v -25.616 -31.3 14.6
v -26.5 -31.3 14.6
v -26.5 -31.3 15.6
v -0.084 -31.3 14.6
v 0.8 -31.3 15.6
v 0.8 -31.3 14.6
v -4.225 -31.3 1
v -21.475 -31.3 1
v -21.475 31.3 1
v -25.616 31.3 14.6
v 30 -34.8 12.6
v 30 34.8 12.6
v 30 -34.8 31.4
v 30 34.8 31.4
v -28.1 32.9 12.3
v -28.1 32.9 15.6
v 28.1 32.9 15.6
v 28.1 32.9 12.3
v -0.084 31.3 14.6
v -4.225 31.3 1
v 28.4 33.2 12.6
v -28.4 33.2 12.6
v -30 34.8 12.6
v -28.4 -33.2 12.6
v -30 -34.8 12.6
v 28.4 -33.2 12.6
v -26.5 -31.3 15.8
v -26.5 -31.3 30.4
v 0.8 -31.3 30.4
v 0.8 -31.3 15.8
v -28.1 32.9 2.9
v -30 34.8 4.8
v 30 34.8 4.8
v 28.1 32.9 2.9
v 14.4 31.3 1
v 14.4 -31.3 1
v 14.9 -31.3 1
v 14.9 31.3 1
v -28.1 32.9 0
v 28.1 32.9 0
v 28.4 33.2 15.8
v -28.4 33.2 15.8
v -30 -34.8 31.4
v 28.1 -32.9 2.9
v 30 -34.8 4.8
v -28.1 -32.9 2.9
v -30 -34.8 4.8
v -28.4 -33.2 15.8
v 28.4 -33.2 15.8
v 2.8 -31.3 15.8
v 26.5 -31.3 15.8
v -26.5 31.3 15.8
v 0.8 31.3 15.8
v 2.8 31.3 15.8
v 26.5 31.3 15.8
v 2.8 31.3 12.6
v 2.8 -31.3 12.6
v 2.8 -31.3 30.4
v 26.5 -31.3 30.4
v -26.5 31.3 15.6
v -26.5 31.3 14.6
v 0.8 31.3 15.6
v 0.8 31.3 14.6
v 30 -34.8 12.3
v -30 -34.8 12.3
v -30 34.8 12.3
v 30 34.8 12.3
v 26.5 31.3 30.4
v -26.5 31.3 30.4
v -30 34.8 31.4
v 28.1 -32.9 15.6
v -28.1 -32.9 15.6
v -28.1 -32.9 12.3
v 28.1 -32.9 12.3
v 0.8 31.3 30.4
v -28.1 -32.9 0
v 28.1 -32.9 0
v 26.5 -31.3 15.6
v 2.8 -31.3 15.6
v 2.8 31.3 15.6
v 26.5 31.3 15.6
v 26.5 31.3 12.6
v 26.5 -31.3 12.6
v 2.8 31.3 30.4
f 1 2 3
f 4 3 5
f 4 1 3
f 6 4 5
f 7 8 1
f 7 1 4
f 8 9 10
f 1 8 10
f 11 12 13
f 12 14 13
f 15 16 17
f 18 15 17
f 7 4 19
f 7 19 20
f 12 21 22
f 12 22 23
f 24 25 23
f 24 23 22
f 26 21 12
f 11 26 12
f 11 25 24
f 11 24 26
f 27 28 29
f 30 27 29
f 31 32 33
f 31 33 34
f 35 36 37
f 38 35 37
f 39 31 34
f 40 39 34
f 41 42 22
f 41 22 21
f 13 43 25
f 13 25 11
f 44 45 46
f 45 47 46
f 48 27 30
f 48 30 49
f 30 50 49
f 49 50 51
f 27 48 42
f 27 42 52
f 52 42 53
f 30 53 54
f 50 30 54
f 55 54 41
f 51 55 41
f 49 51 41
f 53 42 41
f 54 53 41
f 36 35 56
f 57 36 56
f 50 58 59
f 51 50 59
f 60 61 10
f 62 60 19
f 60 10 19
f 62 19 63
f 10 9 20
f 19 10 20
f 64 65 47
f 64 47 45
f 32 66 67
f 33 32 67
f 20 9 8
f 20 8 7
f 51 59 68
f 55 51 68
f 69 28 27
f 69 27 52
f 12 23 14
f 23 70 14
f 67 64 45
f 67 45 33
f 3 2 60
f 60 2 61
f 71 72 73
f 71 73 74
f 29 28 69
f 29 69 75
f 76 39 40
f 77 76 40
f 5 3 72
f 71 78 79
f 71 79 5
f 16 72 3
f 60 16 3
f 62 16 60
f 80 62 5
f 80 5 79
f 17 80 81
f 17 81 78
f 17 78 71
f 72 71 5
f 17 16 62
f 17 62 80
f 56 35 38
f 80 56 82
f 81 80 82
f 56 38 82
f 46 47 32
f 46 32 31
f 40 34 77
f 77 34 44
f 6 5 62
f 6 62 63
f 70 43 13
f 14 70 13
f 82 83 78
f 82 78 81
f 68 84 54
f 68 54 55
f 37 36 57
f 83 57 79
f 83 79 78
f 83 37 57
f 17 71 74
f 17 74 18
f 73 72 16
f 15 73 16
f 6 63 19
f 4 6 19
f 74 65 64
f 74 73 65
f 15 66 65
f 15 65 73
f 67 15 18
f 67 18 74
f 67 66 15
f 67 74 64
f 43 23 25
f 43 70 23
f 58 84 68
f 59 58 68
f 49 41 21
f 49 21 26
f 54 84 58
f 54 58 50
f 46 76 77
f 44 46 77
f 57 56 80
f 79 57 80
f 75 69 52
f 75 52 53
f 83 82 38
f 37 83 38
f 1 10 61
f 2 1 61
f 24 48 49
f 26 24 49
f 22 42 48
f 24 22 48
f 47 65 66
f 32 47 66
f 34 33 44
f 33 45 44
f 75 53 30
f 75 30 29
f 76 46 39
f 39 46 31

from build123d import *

# Parameters (mm, degrees)
F6_W          = 60
F6_H          = 69.6
F7_DEPTH      = 1
F8_W          = 60
F8_H          = 69.6
F8_W_2        = 53
F8_H_2        = 62.6
F9_DEPTH      = 14.6
F11_DEPTH     = 62.6
F14_W         = 60
F14_H         = 69.6
F14_W_2       = 56.2
F14_H_2       = 65.8
F15_DEPTH     = 3.3
F16_W         = 60
F16_H         = 69.6
F16_W_2       = 56.2
F16_H_2       = 65.8
F17_DEPTH     = 4.9
F18_T4_DEPTH  = 56.2
F18_T9_DEPTH  = 65.8
F18_T14_DEPTH = 56.2
F18_T19_DEPTH = 65.8
F18_T25_DEPTH = 61.3433659759
F18_T31_DEPTH = 70.9433659759
F18_T40_DEPTH = 61.3433659759
F18_T46_DEPTH = 70.9433659759
F18_T55_DEPTH = 61.3433659759
F18_T61_DEPTH = 70.9433659759
F18_T70_DEPTH = 70.9433659759
F18_T76_DEPTH = 61.3433659759
F19_W         = 60
F19_H         = 69.6
F19_W_2       = 56.8
F19_H_2       = 66.4
F20_DEPTH     = 3.2
F21_DEPTH     = 62.6


# Not quite as in the source:
# - a fillet or chamfer that OpenCascade refuses, or shapes differently, is made with other operations: its cross-section is extruded or revolved along the edge and cut away or added


with BuildPart() as f7:
    # F6 (on Top) → F7 (new body)
    with BuildSketch(Plane.XY):
        Rectangle(F6_W, F6_H)
    extrude(amount=F7_DEPTH)

    # F8 (on face) → F9 (join)
    with BuildSketch(Plane.XY.offset(1)):
        Rectangle(F8_W, F8_H)
        Rectangle(F8_W_2, F8_H_2, mode=Mode.SUBTRACT)
    extrude(amount=F9_DEPTH)

    # F10 (on face) → F11 (join, through all)
    with BuildSketch(Plane.XZ.offset(-31.3)):
        Polygon((2.8, 15.6), (0.8, 15.6), (0.8, 14.6), (0.8, 1), (2.8, 1), (2.8, 12.6), align=None)
    extrude(amount=F11_DEPTH)


with BuildPart() as f13_1:
    # F13: instance of F7
    add(f7.part.mirror(Plane(origin=(0.2291641245, 0, 15.7), x_dir=(1, 0, 0), z_dir=(0, 0, 1))))

    # F19 (on face) → F20 (join)
    with BuildSketch(Plane(origin=(0, 0, 15.8), x_dir=(1, 0, 0), z_dir=(0, 0, -1))):
        Rectangle(F19_W, F19_H)
        Rectangle(F19_W_2, F19_H_2, mode=Mode.SUBTRACT)
    extrude(amount=F20_DEPTH)


with BuildPart() as f7_1:
    add(f7.part)

    # F14 (on face) → F15 (cut)
    with BuildSketch(Plane.XY.offset(15.6)):
        Rectangle(F14_W, F14_H)
        Rectangle(F14_W_2, F14_H_2, mode=Mode.SUBTRACT)
    extrude(amount=-F15_DEPTH, mode=Mode.SUBTRACT)

    # F16 (on face) → F17 (cut)
    with BuildSketch(Plane(origin=(0, 0, 0), x_dir=(1, 0, 0), z_dir=(0, 0, -1))):
        Rectangle(F16_W, F16_H)
        Rectangle(F16_W_2, F16_H_2, mode=Mode.SUBTRACT)
    extrude(amount=-F17_DEPTH, mode=Mode.SUBTRACT)

    # F18: chamfer of 2 on 4 edges, made by hand


with BuildPart() as f18_tool2:
    # F18_s3 → F18_t4 (new body)
    with BuildSketch(Plane.YZ.offset(-28.1)):
        Polygon((-34.9, 4.9), (-32.9, 2.9), (-32.9, 4.9), align=None)
    extrude(amount=F18_T4_DEPTH)

    split(bisect_by=Plane.XZ.offset(34.8), keep=Keep.BOTTOM)


with BuildPart() as f7_2:
    add(f7_1.part)

    # F18_t1: union F18_tool2
    add(f18_tool2.part)


with BuildPart() as f18_tool7:
    # F18_s8 → F18_t9 (new body)
    with BuildSketch(Plane.XZ.offset(-32.9)):
        Polygon((-30.1, 4.9), (-28.1, 2.9), (-28.1, 4.9), align=None)
    extrude(amount=F18_T9_DEPTH)

    split(bisect_by=Plane.YZ.offset(-30), keep=Keep.TOP)


with BuildPart() as f7_3:
    add(f7_2.part)

    # F18_t6: union F18_tool7
    add(f18_tool7.part)


with BuildPart() as f18_tool12:
    # F18_s13 → F18_t14 (new body)
    with BuildSketch(Plane.YZ.offset(28.1)):
        Polygon((34.9, 4.9), (32.9, 2.9), (32.9, 4.9), align=None)
    extrude(amount=-F18_T14_DEPTH)

    split(bisect_by=Plane.XZ.offset(-34.8), keep=Keep.TOP)


with BuildPart() as f7_4:
    add(f7_3.part)

    # F18_t11: union F18_tool12
    add(f18_tool12.part)


with BuildPart() as f18_tool17:
    # F18_s18 → F18_t19 (new body)
    with BuildSketch(Plane.XZ.offset(32.9)):
        Polygon((30.1, 4.9), (28.1, 2.9), (28.1, 4.9), align=None)
    extrude(amount=-F18_T19_DEPTH)

    split(bisect_by=Plane.YZ.offset(30), keep=Keep.BOTTOM)


with BuildPart() as f7_5:
    add(f7_4.part)

    # F18_t16: union F18_tool17
    add(f18_tool17.part)


with BuildPart() as f18_tool23:
    # F18_s24 → F18_t25 (new body)
    with BuildSketch(Plane.YZ.offset(-33.2433659759)):
        Polygon((-34.9, 4.9), (-32.9, 2.9), (-32.9, 4.9), align=None)
    extrude(amount=F18_T25_DEPTH)

    split(bisect_by=Plane.XZ.offset(34.8), keep=Keep.BOTTOM)

    split(bisect_by=Plane.YZ.offset(-30), keep=Keep.TOP)

    split(bisect_by=Plane.YZ.offset(-28.1), keep=Keep.BOTTOM)


with BuildPart() as f18_tool29:
    # F18_s30 → F18_t31 (new body)
    with BuildSketch(Plane.XZ.offset(-32.9)):
        Polygon((-30.1, 4.9), (-28.1, 2.9), (-28.1, 4.9), align=None)
    extrude(amount=F18_T31_DEPTH)

    split(bisect_by=Plane.XZ.offset(34.8), keep=Keep.BOTTOM)

    split(bisect_by=Plane.YZ.offset(-30), keep=Keep.TOP)

    split(bisect_by=Plane.XZ.offset(32.9), keep=Keep.TOP)


with BuildPart() as f18_tool23_1:
    add(f18_tool23.part)

    # F18_t35: intersect F18_tool29
    add(f18_tool29.part, mode=Mode.INTERSECT)


with BuildPart() as f7_6:
    add(f7_5.part)

    # F18_t21: union F18_tool23
    add(f18_tool23_1.part)


with BuildPart() as f18_tool38:
    # F18_s39 → F18_t40 (new body)
    with BuildSketch(Plane.YZ.offset(-28.1)):
        Polygon((-34.9, 4.9), (-32.9, 2.9), (-32.9, 4.9), align=None)
    extrude(amount=F18_T40_DEPTH)

    split(bisect_by=Plane.XZ.offset(34.8), keep=Keep.BOTTOM)

    split(bisect_by=Plane.YZ.offset(30), keep=Keep.BOTTOM)

    split(bisect_by=Plane.YZ.offset(28.1), keep=Keep.TOP)


with BuildPart() as f18_tool44:
    # F18_s45 → F18_t46 (new body)
    with BuildSketch(Plane.XZ.offset(38.0433659759)):
        Polygon((30.1, 4.9), (28.1, 2.9), (28.1, 4.9), align=None)
    extrude(amount=-F18_T46_DEPTH)

    split(bisect_by=Plane.XZ.offset(34.8), keep=Keep.BOTTOM)

    split(bisect_by=Plane.YZ.offset(30), keep=Keep.BOTTOM)

    split(bisect_by=Plane.XZ.offset(32.9), keep=Keep.TOP)


with BuildPart() as f18_tool38_1:
    add(f18_tool38.part)

    # F18_t50: intersect F18_tool44
    add(f18_tool44.part, mode=Mode.INTERSECT)


with BuildPart() as f7_7:
    add(f7_6.part)

    # F18_t36: union F18_tool38
    add(f18_tool38_1.part)


with BuildPart() as f18_tool53:
    # F18_s54 → F18_t55 (new body)
    with BuildSketch(Plane.YZ.offset(28.1)):
        Polygon((34.9, 4.9), (32.9, 2.9), (32.9, 4.9), align=None)
    extrude(amount=-F18_T55_DEPTH)

    split(bisect_by=Plane.YZ.offset(-30), keep=Keep.TOP)

    split(bisect_by=Plane.XZ.offset(-34.8), keep=Keep.TOP)

    split(bisect_by=Plane.YZ.offset(-28.1), keep=Keep.BOTTOM)


with BuildPart() as f18_tool59:
    # F18_s60 → F18_t61 (new body)
    with BuildSketch(Plane.XZ.offset(-38.0433659759)):
        Polygon((-30.1, 4.9), (-28.1, 2.9), (-28.1, 4.9), align=None)
    extrude(amount=F18_T61_DEPTH)

    split(bisect_by=Plane.YZ.offset(-30), keep=Keep.TOP)

    split(bisect_by=Plane.XZ.offset(-34.8), keep=Keep.TOP)

    split(bisect_by=Plane.XZ.offset(-32.9), keep=Keep.BOTTOM)


with BuildPart() as f18_tool53_1:
    add(f18_tool53.part)

    # F18_t65: intersect F18_tool59
    add(f18_tool59.part, mode=Mode.INTERSECT)


with BuildPart() as f7_8:
    add(f7_7.part)

    # F18_t51: union F18_tool53
    add(f18_tool53_1.part)


with BuildPart() as f18_tool68:
    # F18_s69 → F18_t70 (new body)
    with BuildSketch(Plane.XZ.offset(32.9)):
        Polygon((30.1, 4.9), (28.1, 2.9), (28.1, 4.9), align=None)
    extrude(amount=-F18_T70_DEPTH)

    split(bisect_by=Plane.YZ.offset(30), keep=Keep.BOTTOM)

    split(bisect_by=Plane.XZ.offset(-34.8), keep=Keep.TOP)

    split(bisect_by=Plane.XZ.offset(-32.9), keep=Keep.BOTTOM)


with BuildPart() as f18_tool74:
    # F18_s75 → F18_t76 (new body)
    with BuildSketch(Plane.YZ.offset(33.2433659759)):
        Polygon((34.9, 4.9), (32.9, 2.9), (32.9, 4.9), align=None)
    extrude(amount=-F18_T76_DEPTH)

    split(bisect_by=Plane.YZ.offset(30), keep=Keep.BOTTOM)

    split(bisect_by=Plane.XZ.offset(-34.8), keep=Keep.TOP)

    split(bisect_by=Plane.YZ.offset(28.1), keep=Keep.TOP)


with BuildPart() as f18_tool68_1:
    add(f18_tool68.part)

    # F18_t80: intersect F18_tool74
    add(f18_tool74.part, mode=Mode.INTERSECT)


with BuildPart() as f7_9:
    add(f7_8.part)

    # F18_t66: union F18_tool68
    add(f18_tool68_1.part)

    # F10 (on face) → F21 (join, through all)
    with BuildSketch(Plane.XZ.offset(-31.3)):
        Polygon((14.4, 1), (2.8, 12.6), (2.8, 1), align=None)
        Polygon((26.5, 1), (26.5, 12.6), (14.9, 1), align=None)
        Polygon((-21.475, 1), (-25.6163476009, 14.6), (-26.5, 14.6), (-26.5, 1), align=None)
        Polygon((0.8, 1), (0.8, 14.6), (-0.0836523991, 14.6), (-4.225, 1), align=None)
    extrude(amount=F21_DEPTH)


solid = Compound([f13_1.part, f7_9.part])
